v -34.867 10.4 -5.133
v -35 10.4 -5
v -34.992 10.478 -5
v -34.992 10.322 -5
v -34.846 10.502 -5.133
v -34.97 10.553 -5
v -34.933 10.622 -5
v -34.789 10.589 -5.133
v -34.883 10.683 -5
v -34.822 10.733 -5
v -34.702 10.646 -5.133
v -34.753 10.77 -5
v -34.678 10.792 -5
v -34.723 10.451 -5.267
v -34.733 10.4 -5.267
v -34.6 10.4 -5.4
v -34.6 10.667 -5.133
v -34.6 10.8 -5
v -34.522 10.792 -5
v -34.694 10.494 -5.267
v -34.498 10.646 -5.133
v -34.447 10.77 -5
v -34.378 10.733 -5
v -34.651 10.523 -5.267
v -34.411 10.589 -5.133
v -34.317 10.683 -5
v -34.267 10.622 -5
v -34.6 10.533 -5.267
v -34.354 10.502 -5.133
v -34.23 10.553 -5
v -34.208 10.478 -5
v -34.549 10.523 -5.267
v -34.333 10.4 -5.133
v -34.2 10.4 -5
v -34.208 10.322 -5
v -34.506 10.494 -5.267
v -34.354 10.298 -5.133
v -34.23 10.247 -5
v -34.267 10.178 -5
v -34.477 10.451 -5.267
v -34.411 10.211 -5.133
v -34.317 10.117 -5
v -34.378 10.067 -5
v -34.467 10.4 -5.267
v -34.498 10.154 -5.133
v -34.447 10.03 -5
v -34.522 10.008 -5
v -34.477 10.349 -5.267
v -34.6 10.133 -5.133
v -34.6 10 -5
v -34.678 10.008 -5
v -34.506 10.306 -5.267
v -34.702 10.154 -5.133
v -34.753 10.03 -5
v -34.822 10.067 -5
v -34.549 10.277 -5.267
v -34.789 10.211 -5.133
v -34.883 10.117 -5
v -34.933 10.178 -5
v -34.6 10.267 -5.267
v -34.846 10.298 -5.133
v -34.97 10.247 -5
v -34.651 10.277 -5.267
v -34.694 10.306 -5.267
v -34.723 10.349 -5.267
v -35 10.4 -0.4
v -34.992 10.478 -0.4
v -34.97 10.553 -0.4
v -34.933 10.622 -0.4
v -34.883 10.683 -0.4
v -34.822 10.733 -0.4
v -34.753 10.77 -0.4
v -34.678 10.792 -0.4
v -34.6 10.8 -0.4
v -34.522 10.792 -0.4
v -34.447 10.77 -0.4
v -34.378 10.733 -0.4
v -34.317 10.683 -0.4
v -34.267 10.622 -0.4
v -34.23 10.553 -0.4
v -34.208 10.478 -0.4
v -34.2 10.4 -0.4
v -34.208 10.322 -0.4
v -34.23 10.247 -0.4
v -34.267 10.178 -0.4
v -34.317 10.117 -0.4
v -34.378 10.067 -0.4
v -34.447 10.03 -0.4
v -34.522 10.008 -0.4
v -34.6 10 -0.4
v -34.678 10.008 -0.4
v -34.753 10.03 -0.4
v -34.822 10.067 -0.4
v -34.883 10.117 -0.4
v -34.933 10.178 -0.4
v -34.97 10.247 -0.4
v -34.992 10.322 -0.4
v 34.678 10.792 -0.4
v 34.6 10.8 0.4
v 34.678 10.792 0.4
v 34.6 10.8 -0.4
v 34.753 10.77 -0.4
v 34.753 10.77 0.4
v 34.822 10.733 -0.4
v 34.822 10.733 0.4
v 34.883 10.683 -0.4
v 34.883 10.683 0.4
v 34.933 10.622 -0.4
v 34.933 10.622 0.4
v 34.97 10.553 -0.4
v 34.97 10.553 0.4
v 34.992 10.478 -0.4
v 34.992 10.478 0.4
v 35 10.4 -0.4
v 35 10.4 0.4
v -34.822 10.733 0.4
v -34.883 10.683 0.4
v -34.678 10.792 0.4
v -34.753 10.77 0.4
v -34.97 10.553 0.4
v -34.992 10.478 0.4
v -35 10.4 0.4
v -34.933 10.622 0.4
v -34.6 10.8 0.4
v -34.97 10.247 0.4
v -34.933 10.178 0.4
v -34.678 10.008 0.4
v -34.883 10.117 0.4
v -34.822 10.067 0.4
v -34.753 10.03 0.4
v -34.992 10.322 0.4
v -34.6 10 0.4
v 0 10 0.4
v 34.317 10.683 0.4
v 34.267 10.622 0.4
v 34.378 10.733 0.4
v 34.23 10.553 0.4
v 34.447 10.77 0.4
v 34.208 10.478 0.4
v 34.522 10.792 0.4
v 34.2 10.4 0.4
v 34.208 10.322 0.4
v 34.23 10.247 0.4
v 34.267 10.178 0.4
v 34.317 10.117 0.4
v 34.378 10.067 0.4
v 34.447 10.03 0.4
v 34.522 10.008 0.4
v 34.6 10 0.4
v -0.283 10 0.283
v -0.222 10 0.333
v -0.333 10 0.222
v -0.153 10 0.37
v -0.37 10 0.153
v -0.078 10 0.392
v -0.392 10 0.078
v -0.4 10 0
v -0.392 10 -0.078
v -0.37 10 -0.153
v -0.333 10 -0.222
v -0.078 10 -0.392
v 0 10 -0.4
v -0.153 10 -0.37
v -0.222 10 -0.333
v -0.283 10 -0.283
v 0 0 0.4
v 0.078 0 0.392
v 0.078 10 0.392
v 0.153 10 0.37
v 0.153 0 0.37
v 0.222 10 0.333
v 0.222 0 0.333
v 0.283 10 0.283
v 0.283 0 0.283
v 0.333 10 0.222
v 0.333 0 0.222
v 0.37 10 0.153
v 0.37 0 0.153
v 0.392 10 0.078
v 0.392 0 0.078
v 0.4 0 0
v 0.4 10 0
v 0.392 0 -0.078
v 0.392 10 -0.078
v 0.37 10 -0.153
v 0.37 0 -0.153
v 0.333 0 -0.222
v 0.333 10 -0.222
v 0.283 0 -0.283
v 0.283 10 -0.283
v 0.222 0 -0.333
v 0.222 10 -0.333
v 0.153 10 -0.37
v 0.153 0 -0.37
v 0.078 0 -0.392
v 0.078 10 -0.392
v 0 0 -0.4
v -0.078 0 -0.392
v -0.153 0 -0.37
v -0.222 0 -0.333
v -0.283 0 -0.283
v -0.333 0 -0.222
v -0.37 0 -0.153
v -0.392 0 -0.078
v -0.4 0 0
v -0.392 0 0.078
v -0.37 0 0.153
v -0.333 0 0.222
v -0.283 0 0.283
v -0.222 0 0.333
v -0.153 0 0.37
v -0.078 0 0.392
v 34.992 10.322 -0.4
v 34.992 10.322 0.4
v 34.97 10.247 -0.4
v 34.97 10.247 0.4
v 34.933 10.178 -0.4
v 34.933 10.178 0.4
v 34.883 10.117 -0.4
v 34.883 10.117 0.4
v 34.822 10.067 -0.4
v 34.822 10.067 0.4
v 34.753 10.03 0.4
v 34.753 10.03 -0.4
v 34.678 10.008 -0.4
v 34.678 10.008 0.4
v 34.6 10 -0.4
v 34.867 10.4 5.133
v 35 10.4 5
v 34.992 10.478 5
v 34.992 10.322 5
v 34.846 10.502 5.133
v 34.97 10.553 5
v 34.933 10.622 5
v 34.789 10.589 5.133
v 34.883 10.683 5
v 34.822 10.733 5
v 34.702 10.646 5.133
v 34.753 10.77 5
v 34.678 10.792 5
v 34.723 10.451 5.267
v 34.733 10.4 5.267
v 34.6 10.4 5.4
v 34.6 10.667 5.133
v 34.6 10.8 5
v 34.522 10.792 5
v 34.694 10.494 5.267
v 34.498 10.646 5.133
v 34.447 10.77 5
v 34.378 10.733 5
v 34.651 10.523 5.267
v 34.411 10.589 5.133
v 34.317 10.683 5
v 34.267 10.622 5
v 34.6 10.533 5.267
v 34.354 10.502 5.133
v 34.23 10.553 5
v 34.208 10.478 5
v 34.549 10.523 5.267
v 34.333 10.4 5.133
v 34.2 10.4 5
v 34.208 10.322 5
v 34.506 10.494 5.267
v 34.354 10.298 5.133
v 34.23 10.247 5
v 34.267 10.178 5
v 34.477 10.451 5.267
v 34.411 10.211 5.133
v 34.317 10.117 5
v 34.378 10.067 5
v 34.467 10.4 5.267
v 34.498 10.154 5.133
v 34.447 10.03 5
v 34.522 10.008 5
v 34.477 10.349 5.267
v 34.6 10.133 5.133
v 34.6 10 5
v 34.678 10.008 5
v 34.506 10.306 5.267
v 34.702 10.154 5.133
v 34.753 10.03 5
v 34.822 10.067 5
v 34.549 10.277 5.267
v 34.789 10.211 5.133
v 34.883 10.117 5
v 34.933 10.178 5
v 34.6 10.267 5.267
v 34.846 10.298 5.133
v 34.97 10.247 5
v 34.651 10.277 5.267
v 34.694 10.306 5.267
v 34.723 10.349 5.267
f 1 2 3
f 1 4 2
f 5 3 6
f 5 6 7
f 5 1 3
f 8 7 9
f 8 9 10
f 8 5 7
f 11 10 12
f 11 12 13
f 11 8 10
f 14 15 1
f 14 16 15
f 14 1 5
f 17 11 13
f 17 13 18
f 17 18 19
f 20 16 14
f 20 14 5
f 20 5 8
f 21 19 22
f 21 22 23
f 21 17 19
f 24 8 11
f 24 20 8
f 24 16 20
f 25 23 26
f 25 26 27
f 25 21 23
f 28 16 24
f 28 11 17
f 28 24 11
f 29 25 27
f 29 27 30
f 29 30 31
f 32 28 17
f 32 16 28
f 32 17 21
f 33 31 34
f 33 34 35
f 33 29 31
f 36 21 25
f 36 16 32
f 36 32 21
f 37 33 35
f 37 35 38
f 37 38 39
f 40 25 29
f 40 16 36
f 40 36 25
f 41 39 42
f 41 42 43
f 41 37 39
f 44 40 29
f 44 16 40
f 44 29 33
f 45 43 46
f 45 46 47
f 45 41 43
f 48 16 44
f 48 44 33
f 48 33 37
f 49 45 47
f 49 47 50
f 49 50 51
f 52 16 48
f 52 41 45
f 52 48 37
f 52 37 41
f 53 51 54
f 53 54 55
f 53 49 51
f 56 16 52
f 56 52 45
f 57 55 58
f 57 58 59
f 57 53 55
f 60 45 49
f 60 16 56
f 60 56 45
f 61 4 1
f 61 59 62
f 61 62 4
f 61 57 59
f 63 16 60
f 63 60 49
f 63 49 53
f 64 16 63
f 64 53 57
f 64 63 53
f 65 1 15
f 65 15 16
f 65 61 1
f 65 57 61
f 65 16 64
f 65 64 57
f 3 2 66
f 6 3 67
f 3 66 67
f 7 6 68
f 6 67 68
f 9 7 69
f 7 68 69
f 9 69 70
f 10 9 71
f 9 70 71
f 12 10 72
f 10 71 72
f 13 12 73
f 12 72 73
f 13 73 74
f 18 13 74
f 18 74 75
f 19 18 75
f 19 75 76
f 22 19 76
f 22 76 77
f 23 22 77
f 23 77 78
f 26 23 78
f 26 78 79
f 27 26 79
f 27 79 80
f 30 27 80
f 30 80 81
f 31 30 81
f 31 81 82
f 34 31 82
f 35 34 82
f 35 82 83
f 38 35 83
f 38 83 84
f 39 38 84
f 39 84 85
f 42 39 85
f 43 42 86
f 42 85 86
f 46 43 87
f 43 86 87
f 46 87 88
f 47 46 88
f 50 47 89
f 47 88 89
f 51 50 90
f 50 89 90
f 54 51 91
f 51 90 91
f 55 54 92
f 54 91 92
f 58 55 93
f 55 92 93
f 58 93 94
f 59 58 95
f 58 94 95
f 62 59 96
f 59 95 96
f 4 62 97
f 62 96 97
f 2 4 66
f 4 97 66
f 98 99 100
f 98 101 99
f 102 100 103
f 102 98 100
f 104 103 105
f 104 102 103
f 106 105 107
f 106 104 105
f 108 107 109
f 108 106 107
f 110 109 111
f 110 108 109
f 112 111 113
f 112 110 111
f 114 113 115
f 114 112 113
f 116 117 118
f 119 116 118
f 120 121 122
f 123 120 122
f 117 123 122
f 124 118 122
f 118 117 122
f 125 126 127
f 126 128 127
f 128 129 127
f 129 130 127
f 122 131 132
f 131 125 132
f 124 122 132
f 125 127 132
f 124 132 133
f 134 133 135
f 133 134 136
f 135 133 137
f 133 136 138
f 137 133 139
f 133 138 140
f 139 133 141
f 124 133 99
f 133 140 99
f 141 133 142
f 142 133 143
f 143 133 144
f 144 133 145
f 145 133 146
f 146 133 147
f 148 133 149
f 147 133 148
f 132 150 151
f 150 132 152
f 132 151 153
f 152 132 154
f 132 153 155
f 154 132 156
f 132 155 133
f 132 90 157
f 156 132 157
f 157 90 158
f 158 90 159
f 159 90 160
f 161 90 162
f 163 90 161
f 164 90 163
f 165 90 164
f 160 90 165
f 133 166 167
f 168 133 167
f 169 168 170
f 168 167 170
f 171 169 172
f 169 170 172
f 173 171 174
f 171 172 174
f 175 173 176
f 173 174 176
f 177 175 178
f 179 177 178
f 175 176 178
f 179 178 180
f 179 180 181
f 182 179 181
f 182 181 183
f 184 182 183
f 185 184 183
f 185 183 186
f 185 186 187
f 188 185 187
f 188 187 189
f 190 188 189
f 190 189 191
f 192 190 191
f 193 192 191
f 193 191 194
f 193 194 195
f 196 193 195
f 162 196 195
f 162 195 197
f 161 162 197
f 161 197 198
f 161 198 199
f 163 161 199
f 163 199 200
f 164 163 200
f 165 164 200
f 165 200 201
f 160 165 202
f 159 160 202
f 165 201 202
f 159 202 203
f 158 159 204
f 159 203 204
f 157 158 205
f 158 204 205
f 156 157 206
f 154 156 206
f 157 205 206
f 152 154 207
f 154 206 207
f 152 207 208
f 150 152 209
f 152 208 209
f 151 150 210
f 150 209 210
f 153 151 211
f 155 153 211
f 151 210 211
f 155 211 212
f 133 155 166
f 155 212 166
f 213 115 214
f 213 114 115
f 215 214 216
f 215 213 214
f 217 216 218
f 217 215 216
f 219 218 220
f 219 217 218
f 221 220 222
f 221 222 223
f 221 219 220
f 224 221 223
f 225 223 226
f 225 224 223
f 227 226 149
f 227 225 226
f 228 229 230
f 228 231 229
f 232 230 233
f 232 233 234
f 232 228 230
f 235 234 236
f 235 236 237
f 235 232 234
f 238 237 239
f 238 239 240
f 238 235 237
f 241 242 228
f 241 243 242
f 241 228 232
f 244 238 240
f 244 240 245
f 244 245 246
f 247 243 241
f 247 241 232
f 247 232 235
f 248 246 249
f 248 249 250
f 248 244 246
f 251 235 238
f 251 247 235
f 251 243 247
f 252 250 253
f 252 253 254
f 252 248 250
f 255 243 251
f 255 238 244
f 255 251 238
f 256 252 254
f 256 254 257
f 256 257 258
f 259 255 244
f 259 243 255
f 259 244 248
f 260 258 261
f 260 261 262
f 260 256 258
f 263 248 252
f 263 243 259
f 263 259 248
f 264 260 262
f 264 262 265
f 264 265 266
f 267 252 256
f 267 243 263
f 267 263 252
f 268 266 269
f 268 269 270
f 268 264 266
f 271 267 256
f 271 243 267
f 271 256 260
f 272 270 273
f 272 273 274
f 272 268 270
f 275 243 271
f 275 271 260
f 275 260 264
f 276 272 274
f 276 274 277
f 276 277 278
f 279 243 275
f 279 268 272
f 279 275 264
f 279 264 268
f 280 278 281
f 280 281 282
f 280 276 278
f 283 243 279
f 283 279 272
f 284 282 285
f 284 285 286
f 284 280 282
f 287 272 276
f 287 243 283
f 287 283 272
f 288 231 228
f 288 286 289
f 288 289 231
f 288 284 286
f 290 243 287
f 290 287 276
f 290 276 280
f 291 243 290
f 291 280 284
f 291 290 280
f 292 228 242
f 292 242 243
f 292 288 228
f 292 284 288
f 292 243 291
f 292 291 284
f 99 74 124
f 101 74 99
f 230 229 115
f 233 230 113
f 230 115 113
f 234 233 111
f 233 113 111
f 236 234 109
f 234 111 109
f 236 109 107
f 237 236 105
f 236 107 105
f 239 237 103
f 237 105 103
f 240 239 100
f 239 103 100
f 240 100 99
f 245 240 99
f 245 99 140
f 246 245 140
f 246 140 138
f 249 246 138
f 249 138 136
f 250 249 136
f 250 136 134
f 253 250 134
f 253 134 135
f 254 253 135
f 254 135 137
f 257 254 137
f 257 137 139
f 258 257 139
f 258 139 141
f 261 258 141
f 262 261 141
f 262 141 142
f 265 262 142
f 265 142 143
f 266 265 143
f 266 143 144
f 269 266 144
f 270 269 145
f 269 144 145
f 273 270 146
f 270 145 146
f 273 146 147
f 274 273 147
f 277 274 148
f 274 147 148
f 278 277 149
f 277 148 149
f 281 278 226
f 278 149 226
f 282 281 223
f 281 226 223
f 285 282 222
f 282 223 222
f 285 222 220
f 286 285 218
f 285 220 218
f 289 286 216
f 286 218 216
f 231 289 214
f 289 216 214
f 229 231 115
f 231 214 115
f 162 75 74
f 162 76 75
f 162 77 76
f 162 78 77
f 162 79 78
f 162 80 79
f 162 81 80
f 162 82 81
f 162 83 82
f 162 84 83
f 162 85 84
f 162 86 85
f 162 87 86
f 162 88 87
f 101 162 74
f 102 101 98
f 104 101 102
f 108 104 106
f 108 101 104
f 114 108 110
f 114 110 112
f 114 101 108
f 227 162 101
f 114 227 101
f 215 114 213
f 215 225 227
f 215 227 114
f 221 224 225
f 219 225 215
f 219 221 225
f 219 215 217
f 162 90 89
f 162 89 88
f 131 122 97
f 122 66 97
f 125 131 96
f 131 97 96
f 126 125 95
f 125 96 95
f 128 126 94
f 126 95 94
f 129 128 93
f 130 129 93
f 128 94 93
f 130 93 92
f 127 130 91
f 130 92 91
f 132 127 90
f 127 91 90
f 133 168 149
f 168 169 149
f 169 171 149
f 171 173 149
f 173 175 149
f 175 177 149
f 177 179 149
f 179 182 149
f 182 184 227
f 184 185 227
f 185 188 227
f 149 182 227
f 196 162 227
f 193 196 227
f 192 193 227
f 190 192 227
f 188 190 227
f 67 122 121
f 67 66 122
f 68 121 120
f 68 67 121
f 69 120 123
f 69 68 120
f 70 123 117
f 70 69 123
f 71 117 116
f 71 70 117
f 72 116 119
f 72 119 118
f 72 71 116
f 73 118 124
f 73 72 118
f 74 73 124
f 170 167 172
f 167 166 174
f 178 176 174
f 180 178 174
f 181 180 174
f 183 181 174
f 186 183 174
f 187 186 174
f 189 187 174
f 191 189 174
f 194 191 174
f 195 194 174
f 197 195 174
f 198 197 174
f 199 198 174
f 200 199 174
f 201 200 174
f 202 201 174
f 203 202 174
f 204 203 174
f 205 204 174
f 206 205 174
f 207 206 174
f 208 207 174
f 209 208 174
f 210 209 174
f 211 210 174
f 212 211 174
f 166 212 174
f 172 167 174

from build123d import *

# Parameters (mm, degrees)
SKETCH_1_R      = 0.4
EXTRUDE_1_DEPTH = 10
SKETCH_2_W      = 70
SKETCH_2_H      = 0.8
EXTRUDE_2_DEPTH = 0.8
FILLET_1_R      = 0.4
SKETCH_3_R      = 0.4
EXTRUDE_3_DEPTH = 5
SKETCH_4_R      = 0.4
EXTRUDE_4_DEPTH = 5
CHAMFER_1_SIZE  = 0.4


with BuildPart() as part:
    # 草图1 → 凸台-拉伸1 (new body)
    with BuildSketch(Plane(origin=(0, 0, 0), x_dir=(1, 0, 0), z_dir=(0, 1, 0))):
        with Locations(Location((0, 0, 0), (0, 0, 270))):
            Circle(SKETCH_1_R)
    extrude(amount=EXTRUDE_1_DEPTH)

    # 草图2 → 凸台-拉伸2 (add)
    with BuildSketch(Plane(origin=(0, 10, 0), x_dir=(1, 0, 0), z_dir=(0, 1, 0))):
        Rectangle(SKETCH_2_W, SKETCH_2_H)
    extrude(amount=EXTRUDE_2_DEPTH)

    # 圆角1
    fillet_1_edges = [part.edges().sort_by_distance(p)[0] for p in [
        (35, 10, 0),
        (35, 10.8, 0),
        (-35, 10, 0),
        (-35, 10.8, 0),
    ]]
    fillet(fillet_1_edges, radius=FILLET_1_R - 0.0001)  # a hair under: the kernel refuses the full size

    # 草图3 → 凸台-拉伸3 (add)
    with BuildSketch(Plane.XY.offset(0.4)):
        with Locations((34.6, 10.4)):
            Circle(SKETCH_3_R)
    extrude(amount=EXTRUDE_3_DEPTH)

    # 草图4 → 凸台-拉伸4 (add)
    with BuildSketch(Plane(origin=(0, 0, -0.4), x_dir=(-1, 0, 0), z_dir=(0, 0, -1))):
        with Locations((34.6, 10.4)):
            Circle(SKETCH_4_R)
    extrude(amount=EXTRUDE_4_DEPTH)

    # 倒角1
    chamfer_1_edges = [part.edges().sort_by_distance(p)[0] for p in [
        (34.2, 10.4, 5.4),
        (-34.2, 10.4, -5.4),
    ]]
    chamfer(chamfer_1_edges, length=CHAMFER_1_SIZE - 0.0001)  # a hair under: the kernel refuses the full size


solid = part.part
